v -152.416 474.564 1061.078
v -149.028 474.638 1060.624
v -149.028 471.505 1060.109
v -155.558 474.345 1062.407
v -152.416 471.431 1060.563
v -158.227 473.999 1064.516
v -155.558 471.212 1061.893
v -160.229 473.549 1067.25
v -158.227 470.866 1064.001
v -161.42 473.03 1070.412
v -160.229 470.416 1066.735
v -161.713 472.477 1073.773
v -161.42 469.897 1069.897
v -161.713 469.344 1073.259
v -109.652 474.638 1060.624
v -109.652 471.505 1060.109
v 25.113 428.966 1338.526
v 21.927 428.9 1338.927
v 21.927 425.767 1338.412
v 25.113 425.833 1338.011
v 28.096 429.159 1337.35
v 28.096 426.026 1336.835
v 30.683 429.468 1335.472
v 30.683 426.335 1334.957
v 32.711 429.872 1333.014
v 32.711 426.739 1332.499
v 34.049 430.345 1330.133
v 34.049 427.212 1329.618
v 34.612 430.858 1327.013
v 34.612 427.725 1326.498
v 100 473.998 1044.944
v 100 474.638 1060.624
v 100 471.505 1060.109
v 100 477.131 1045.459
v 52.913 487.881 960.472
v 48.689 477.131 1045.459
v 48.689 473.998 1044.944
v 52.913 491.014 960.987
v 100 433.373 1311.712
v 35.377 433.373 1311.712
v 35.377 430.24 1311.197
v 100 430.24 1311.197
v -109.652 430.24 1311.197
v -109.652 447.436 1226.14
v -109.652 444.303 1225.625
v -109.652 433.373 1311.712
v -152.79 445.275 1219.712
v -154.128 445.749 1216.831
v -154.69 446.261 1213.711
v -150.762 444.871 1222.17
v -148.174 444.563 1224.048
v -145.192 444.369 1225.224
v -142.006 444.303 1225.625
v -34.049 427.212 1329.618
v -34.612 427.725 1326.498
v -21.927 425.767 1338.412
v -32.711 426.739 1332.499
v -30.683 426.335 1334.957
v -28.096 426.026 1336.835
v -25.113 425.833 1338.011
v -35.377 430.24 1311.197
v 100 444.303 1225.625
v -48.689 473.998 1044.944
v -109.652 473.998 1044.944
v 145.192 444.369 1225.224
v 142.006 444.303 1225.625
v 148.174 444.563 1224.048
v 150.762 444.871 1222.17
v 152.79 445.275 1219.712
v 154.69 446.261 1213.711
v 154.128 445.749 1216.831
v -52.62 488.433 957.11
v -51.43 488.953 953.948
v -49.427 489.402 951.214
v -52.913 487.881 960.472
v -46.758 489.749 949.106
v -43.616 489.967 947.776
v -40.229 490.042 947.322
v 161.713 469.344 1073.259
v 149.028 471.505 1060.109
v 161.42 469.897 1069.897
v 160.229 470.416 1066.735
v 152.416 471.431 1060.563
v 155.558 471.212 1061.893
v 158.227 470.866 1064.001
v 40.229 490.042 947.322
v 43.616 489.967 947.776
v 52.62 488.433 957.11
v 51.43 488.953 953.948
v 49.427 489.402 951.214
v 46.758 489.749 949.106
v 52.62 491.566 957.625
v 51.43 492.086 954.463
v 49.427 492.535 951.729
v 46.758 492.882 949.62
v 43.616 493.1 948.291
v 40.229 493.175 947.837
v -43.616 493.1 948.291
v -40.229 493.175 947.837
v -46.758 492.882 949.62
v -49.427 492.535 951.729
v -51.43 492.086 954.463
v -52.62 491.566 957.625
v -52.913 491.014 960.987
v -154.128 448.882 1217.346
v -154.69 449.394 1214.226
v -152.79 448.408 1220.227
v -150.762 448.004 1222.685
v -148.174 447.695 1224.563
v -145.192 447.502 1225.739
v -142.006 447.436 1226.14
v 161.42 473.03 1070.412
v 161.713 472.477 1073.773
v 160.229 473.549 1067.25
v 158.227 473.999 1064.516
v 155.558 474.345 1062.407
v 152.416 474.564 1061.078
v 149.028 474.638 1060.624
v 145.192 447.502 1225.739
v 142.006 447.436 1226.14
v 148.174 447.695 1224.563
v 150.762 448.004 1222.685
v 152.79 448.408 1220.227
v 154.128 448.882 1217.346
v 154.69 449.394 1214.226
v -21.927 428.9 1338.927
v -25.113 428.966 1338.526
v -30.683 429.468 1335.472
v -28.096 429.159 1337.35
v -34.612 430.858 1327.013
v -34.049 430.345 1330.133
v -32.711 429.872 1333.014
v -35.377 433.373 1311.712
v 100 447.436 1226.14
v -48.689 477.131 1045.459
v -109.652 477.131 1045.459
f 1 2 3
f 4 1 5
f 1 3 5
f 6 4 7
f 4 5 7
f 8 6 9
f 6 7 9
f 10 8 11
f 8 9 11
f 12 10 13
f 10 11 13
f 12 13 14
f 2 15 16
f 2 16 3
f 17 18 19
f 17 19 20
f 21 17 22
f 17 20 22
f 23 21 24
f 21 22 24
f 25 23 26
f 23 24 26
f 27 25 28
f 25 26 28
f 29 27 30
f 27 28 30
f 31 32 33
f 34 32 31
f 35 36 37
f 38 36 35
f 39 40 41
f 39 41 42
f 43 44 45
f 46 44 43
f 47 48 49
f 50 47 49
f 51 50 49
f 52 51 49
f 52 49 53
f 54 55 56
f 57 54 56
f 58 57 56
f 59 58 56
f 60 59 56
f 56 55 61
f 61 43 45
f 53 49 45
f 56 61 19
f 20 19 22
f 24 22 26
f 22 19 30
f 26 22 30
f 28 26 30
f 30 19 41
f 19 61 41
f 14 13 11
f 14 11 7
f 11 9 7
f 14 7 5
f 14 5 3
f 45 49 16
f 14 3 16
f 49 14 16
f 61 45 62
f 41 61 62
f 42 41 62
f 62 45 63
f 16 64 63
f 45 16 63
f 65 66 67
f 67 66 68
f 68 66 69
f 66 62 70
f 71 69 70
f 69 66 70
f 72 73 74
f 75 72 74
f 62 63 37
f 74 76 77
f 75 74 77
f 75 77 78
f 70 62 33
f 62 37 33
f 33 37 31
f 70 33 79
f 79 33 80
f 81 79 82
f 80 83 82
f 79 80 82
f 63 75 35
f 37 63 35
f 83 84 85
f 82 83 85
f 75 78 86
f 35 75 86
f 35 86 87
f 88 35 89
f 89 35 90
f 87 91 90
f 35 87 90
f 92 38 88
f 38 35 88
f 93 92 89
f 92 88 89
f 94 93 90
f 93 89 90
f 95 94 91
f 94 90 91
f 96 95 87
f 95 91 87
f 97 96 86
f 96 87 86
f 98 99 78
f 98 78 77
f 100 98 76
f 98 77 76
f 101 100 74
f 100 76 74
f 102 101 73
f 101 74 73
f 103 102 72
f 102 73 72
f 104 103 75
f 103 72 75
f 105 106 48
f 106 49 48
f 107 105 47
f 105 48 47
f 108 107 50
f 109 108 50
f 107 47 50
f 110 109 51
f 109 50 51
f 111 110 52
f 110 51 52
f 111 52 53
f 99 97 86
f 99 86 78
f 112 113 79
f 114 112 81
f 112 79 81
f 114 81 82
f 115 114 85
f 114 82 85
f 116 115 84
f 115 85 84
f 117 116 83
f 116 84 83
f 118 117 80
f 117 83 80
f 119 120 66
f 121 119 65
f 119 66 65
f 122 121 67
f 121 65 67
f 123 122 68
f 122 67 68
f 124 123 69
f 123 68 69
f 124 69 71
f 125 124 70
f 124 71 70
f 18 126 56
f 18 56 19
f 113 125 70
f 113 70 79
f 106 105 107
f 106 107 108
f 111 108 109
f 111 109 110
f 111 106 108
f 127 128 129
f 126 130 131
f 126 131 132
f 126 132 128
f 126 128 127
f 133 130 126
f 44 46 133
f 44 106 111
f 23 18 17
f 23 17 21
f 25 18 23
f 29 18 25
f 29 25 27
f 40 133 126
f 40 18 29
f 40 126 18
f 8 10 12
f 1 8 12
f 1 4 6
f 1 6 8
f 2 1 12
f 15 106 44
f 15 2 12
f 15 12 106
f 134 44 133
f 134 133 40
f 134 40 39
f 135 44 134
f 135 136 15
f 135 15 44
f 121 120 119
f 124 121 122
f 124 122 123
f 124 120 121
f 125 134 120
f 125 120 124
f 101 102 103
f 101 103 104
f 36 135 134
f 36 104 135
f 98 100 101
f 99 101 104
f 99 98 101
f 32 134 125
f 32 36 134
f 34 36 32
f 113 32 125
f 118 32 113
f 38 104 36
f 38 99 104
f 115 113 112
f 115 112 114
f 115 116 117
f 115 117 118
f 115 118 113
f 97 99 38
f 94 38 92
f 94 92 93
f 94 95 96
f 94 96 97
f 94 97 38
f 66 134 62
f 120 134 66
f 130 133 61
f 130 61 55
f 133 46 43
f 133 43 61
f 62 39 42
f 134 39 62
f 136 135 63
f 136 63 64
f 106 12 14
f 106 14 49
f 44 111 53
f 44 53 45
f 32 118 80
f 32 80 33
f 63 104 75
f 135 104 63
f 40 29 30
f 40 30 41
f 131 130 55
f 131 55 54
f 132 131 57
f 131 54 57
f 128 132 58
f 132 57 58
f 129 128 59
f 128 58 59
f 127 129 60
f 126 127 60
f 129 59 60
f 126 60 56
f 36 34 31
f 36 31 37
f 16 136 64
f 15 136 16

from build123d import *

# Parameters (mm, degrees)
BOSS_EXTRUDE1_DEPTH = 3.175
FILLET1_R           = 12.7


with BuildPart() as part:
    # Sketch2 → Boss-Extrude1 (new body)
    with BuildSketch(Plane(origin=(0, 631.882105473, 103.848248331), x_dir=(1, 0, 0), z_dir=(0, 0.9867625124381899, 0.16217195826243017))):
        Polygon((100, -1224.067157157), (100, -1137.347457675), (154.094451659, -1137.347457675), (162.370253897, -969.61100369), (100, -969.61100369), (100, -954.242157057), (48.689491118, -954.242157057), (53.570568791, -855.31100369), (-53.570568791, -855.31100369), (-48.689491118, -954.242157057), (-100, -954.242157057), (-109.652, -954.242157057), (-109.652, -969.61100369), (-162.370253897, -969.61100369), (-154.094451659, -1137.347457675), (-109.652, -1137.347457675), (-109.652, -1224.067157157), (-100, -1224.067157157), (-35.376831367, -1224.067157157), (-34.016071035, -1251.647457675), (34.016071035, -1251.647457675), (35.376831367, -1224.067157157), align=None)
    extrude(amount=-BOSS_EXTRUDE1_DEPTH)

    # Fillet1
    fillet1_edges = [part.edges().sort_by_distance(p)[0] for p in [
        (34.016071035, 427.333500719, 1338.66959037),
        (-34.016071035, 427.333500719, 1338.66959037),
        (-154.094451659, 445.869755548, 1225.882635198),
        (-162.370253897, 473.071904763, 1060.366590436),
        (-53.570568791, 491.608159593, 947.579635264),
        (53.570568791, 491.608159593, 947.579635264),
        (162.370253897, 473.071904763, 1060.366590436),
        (154.094451659, 445.869755548, 1225.882635198),
    ]]
    fillet(fillet1_edges, radius=FILLET1_R)


solid = part.part
